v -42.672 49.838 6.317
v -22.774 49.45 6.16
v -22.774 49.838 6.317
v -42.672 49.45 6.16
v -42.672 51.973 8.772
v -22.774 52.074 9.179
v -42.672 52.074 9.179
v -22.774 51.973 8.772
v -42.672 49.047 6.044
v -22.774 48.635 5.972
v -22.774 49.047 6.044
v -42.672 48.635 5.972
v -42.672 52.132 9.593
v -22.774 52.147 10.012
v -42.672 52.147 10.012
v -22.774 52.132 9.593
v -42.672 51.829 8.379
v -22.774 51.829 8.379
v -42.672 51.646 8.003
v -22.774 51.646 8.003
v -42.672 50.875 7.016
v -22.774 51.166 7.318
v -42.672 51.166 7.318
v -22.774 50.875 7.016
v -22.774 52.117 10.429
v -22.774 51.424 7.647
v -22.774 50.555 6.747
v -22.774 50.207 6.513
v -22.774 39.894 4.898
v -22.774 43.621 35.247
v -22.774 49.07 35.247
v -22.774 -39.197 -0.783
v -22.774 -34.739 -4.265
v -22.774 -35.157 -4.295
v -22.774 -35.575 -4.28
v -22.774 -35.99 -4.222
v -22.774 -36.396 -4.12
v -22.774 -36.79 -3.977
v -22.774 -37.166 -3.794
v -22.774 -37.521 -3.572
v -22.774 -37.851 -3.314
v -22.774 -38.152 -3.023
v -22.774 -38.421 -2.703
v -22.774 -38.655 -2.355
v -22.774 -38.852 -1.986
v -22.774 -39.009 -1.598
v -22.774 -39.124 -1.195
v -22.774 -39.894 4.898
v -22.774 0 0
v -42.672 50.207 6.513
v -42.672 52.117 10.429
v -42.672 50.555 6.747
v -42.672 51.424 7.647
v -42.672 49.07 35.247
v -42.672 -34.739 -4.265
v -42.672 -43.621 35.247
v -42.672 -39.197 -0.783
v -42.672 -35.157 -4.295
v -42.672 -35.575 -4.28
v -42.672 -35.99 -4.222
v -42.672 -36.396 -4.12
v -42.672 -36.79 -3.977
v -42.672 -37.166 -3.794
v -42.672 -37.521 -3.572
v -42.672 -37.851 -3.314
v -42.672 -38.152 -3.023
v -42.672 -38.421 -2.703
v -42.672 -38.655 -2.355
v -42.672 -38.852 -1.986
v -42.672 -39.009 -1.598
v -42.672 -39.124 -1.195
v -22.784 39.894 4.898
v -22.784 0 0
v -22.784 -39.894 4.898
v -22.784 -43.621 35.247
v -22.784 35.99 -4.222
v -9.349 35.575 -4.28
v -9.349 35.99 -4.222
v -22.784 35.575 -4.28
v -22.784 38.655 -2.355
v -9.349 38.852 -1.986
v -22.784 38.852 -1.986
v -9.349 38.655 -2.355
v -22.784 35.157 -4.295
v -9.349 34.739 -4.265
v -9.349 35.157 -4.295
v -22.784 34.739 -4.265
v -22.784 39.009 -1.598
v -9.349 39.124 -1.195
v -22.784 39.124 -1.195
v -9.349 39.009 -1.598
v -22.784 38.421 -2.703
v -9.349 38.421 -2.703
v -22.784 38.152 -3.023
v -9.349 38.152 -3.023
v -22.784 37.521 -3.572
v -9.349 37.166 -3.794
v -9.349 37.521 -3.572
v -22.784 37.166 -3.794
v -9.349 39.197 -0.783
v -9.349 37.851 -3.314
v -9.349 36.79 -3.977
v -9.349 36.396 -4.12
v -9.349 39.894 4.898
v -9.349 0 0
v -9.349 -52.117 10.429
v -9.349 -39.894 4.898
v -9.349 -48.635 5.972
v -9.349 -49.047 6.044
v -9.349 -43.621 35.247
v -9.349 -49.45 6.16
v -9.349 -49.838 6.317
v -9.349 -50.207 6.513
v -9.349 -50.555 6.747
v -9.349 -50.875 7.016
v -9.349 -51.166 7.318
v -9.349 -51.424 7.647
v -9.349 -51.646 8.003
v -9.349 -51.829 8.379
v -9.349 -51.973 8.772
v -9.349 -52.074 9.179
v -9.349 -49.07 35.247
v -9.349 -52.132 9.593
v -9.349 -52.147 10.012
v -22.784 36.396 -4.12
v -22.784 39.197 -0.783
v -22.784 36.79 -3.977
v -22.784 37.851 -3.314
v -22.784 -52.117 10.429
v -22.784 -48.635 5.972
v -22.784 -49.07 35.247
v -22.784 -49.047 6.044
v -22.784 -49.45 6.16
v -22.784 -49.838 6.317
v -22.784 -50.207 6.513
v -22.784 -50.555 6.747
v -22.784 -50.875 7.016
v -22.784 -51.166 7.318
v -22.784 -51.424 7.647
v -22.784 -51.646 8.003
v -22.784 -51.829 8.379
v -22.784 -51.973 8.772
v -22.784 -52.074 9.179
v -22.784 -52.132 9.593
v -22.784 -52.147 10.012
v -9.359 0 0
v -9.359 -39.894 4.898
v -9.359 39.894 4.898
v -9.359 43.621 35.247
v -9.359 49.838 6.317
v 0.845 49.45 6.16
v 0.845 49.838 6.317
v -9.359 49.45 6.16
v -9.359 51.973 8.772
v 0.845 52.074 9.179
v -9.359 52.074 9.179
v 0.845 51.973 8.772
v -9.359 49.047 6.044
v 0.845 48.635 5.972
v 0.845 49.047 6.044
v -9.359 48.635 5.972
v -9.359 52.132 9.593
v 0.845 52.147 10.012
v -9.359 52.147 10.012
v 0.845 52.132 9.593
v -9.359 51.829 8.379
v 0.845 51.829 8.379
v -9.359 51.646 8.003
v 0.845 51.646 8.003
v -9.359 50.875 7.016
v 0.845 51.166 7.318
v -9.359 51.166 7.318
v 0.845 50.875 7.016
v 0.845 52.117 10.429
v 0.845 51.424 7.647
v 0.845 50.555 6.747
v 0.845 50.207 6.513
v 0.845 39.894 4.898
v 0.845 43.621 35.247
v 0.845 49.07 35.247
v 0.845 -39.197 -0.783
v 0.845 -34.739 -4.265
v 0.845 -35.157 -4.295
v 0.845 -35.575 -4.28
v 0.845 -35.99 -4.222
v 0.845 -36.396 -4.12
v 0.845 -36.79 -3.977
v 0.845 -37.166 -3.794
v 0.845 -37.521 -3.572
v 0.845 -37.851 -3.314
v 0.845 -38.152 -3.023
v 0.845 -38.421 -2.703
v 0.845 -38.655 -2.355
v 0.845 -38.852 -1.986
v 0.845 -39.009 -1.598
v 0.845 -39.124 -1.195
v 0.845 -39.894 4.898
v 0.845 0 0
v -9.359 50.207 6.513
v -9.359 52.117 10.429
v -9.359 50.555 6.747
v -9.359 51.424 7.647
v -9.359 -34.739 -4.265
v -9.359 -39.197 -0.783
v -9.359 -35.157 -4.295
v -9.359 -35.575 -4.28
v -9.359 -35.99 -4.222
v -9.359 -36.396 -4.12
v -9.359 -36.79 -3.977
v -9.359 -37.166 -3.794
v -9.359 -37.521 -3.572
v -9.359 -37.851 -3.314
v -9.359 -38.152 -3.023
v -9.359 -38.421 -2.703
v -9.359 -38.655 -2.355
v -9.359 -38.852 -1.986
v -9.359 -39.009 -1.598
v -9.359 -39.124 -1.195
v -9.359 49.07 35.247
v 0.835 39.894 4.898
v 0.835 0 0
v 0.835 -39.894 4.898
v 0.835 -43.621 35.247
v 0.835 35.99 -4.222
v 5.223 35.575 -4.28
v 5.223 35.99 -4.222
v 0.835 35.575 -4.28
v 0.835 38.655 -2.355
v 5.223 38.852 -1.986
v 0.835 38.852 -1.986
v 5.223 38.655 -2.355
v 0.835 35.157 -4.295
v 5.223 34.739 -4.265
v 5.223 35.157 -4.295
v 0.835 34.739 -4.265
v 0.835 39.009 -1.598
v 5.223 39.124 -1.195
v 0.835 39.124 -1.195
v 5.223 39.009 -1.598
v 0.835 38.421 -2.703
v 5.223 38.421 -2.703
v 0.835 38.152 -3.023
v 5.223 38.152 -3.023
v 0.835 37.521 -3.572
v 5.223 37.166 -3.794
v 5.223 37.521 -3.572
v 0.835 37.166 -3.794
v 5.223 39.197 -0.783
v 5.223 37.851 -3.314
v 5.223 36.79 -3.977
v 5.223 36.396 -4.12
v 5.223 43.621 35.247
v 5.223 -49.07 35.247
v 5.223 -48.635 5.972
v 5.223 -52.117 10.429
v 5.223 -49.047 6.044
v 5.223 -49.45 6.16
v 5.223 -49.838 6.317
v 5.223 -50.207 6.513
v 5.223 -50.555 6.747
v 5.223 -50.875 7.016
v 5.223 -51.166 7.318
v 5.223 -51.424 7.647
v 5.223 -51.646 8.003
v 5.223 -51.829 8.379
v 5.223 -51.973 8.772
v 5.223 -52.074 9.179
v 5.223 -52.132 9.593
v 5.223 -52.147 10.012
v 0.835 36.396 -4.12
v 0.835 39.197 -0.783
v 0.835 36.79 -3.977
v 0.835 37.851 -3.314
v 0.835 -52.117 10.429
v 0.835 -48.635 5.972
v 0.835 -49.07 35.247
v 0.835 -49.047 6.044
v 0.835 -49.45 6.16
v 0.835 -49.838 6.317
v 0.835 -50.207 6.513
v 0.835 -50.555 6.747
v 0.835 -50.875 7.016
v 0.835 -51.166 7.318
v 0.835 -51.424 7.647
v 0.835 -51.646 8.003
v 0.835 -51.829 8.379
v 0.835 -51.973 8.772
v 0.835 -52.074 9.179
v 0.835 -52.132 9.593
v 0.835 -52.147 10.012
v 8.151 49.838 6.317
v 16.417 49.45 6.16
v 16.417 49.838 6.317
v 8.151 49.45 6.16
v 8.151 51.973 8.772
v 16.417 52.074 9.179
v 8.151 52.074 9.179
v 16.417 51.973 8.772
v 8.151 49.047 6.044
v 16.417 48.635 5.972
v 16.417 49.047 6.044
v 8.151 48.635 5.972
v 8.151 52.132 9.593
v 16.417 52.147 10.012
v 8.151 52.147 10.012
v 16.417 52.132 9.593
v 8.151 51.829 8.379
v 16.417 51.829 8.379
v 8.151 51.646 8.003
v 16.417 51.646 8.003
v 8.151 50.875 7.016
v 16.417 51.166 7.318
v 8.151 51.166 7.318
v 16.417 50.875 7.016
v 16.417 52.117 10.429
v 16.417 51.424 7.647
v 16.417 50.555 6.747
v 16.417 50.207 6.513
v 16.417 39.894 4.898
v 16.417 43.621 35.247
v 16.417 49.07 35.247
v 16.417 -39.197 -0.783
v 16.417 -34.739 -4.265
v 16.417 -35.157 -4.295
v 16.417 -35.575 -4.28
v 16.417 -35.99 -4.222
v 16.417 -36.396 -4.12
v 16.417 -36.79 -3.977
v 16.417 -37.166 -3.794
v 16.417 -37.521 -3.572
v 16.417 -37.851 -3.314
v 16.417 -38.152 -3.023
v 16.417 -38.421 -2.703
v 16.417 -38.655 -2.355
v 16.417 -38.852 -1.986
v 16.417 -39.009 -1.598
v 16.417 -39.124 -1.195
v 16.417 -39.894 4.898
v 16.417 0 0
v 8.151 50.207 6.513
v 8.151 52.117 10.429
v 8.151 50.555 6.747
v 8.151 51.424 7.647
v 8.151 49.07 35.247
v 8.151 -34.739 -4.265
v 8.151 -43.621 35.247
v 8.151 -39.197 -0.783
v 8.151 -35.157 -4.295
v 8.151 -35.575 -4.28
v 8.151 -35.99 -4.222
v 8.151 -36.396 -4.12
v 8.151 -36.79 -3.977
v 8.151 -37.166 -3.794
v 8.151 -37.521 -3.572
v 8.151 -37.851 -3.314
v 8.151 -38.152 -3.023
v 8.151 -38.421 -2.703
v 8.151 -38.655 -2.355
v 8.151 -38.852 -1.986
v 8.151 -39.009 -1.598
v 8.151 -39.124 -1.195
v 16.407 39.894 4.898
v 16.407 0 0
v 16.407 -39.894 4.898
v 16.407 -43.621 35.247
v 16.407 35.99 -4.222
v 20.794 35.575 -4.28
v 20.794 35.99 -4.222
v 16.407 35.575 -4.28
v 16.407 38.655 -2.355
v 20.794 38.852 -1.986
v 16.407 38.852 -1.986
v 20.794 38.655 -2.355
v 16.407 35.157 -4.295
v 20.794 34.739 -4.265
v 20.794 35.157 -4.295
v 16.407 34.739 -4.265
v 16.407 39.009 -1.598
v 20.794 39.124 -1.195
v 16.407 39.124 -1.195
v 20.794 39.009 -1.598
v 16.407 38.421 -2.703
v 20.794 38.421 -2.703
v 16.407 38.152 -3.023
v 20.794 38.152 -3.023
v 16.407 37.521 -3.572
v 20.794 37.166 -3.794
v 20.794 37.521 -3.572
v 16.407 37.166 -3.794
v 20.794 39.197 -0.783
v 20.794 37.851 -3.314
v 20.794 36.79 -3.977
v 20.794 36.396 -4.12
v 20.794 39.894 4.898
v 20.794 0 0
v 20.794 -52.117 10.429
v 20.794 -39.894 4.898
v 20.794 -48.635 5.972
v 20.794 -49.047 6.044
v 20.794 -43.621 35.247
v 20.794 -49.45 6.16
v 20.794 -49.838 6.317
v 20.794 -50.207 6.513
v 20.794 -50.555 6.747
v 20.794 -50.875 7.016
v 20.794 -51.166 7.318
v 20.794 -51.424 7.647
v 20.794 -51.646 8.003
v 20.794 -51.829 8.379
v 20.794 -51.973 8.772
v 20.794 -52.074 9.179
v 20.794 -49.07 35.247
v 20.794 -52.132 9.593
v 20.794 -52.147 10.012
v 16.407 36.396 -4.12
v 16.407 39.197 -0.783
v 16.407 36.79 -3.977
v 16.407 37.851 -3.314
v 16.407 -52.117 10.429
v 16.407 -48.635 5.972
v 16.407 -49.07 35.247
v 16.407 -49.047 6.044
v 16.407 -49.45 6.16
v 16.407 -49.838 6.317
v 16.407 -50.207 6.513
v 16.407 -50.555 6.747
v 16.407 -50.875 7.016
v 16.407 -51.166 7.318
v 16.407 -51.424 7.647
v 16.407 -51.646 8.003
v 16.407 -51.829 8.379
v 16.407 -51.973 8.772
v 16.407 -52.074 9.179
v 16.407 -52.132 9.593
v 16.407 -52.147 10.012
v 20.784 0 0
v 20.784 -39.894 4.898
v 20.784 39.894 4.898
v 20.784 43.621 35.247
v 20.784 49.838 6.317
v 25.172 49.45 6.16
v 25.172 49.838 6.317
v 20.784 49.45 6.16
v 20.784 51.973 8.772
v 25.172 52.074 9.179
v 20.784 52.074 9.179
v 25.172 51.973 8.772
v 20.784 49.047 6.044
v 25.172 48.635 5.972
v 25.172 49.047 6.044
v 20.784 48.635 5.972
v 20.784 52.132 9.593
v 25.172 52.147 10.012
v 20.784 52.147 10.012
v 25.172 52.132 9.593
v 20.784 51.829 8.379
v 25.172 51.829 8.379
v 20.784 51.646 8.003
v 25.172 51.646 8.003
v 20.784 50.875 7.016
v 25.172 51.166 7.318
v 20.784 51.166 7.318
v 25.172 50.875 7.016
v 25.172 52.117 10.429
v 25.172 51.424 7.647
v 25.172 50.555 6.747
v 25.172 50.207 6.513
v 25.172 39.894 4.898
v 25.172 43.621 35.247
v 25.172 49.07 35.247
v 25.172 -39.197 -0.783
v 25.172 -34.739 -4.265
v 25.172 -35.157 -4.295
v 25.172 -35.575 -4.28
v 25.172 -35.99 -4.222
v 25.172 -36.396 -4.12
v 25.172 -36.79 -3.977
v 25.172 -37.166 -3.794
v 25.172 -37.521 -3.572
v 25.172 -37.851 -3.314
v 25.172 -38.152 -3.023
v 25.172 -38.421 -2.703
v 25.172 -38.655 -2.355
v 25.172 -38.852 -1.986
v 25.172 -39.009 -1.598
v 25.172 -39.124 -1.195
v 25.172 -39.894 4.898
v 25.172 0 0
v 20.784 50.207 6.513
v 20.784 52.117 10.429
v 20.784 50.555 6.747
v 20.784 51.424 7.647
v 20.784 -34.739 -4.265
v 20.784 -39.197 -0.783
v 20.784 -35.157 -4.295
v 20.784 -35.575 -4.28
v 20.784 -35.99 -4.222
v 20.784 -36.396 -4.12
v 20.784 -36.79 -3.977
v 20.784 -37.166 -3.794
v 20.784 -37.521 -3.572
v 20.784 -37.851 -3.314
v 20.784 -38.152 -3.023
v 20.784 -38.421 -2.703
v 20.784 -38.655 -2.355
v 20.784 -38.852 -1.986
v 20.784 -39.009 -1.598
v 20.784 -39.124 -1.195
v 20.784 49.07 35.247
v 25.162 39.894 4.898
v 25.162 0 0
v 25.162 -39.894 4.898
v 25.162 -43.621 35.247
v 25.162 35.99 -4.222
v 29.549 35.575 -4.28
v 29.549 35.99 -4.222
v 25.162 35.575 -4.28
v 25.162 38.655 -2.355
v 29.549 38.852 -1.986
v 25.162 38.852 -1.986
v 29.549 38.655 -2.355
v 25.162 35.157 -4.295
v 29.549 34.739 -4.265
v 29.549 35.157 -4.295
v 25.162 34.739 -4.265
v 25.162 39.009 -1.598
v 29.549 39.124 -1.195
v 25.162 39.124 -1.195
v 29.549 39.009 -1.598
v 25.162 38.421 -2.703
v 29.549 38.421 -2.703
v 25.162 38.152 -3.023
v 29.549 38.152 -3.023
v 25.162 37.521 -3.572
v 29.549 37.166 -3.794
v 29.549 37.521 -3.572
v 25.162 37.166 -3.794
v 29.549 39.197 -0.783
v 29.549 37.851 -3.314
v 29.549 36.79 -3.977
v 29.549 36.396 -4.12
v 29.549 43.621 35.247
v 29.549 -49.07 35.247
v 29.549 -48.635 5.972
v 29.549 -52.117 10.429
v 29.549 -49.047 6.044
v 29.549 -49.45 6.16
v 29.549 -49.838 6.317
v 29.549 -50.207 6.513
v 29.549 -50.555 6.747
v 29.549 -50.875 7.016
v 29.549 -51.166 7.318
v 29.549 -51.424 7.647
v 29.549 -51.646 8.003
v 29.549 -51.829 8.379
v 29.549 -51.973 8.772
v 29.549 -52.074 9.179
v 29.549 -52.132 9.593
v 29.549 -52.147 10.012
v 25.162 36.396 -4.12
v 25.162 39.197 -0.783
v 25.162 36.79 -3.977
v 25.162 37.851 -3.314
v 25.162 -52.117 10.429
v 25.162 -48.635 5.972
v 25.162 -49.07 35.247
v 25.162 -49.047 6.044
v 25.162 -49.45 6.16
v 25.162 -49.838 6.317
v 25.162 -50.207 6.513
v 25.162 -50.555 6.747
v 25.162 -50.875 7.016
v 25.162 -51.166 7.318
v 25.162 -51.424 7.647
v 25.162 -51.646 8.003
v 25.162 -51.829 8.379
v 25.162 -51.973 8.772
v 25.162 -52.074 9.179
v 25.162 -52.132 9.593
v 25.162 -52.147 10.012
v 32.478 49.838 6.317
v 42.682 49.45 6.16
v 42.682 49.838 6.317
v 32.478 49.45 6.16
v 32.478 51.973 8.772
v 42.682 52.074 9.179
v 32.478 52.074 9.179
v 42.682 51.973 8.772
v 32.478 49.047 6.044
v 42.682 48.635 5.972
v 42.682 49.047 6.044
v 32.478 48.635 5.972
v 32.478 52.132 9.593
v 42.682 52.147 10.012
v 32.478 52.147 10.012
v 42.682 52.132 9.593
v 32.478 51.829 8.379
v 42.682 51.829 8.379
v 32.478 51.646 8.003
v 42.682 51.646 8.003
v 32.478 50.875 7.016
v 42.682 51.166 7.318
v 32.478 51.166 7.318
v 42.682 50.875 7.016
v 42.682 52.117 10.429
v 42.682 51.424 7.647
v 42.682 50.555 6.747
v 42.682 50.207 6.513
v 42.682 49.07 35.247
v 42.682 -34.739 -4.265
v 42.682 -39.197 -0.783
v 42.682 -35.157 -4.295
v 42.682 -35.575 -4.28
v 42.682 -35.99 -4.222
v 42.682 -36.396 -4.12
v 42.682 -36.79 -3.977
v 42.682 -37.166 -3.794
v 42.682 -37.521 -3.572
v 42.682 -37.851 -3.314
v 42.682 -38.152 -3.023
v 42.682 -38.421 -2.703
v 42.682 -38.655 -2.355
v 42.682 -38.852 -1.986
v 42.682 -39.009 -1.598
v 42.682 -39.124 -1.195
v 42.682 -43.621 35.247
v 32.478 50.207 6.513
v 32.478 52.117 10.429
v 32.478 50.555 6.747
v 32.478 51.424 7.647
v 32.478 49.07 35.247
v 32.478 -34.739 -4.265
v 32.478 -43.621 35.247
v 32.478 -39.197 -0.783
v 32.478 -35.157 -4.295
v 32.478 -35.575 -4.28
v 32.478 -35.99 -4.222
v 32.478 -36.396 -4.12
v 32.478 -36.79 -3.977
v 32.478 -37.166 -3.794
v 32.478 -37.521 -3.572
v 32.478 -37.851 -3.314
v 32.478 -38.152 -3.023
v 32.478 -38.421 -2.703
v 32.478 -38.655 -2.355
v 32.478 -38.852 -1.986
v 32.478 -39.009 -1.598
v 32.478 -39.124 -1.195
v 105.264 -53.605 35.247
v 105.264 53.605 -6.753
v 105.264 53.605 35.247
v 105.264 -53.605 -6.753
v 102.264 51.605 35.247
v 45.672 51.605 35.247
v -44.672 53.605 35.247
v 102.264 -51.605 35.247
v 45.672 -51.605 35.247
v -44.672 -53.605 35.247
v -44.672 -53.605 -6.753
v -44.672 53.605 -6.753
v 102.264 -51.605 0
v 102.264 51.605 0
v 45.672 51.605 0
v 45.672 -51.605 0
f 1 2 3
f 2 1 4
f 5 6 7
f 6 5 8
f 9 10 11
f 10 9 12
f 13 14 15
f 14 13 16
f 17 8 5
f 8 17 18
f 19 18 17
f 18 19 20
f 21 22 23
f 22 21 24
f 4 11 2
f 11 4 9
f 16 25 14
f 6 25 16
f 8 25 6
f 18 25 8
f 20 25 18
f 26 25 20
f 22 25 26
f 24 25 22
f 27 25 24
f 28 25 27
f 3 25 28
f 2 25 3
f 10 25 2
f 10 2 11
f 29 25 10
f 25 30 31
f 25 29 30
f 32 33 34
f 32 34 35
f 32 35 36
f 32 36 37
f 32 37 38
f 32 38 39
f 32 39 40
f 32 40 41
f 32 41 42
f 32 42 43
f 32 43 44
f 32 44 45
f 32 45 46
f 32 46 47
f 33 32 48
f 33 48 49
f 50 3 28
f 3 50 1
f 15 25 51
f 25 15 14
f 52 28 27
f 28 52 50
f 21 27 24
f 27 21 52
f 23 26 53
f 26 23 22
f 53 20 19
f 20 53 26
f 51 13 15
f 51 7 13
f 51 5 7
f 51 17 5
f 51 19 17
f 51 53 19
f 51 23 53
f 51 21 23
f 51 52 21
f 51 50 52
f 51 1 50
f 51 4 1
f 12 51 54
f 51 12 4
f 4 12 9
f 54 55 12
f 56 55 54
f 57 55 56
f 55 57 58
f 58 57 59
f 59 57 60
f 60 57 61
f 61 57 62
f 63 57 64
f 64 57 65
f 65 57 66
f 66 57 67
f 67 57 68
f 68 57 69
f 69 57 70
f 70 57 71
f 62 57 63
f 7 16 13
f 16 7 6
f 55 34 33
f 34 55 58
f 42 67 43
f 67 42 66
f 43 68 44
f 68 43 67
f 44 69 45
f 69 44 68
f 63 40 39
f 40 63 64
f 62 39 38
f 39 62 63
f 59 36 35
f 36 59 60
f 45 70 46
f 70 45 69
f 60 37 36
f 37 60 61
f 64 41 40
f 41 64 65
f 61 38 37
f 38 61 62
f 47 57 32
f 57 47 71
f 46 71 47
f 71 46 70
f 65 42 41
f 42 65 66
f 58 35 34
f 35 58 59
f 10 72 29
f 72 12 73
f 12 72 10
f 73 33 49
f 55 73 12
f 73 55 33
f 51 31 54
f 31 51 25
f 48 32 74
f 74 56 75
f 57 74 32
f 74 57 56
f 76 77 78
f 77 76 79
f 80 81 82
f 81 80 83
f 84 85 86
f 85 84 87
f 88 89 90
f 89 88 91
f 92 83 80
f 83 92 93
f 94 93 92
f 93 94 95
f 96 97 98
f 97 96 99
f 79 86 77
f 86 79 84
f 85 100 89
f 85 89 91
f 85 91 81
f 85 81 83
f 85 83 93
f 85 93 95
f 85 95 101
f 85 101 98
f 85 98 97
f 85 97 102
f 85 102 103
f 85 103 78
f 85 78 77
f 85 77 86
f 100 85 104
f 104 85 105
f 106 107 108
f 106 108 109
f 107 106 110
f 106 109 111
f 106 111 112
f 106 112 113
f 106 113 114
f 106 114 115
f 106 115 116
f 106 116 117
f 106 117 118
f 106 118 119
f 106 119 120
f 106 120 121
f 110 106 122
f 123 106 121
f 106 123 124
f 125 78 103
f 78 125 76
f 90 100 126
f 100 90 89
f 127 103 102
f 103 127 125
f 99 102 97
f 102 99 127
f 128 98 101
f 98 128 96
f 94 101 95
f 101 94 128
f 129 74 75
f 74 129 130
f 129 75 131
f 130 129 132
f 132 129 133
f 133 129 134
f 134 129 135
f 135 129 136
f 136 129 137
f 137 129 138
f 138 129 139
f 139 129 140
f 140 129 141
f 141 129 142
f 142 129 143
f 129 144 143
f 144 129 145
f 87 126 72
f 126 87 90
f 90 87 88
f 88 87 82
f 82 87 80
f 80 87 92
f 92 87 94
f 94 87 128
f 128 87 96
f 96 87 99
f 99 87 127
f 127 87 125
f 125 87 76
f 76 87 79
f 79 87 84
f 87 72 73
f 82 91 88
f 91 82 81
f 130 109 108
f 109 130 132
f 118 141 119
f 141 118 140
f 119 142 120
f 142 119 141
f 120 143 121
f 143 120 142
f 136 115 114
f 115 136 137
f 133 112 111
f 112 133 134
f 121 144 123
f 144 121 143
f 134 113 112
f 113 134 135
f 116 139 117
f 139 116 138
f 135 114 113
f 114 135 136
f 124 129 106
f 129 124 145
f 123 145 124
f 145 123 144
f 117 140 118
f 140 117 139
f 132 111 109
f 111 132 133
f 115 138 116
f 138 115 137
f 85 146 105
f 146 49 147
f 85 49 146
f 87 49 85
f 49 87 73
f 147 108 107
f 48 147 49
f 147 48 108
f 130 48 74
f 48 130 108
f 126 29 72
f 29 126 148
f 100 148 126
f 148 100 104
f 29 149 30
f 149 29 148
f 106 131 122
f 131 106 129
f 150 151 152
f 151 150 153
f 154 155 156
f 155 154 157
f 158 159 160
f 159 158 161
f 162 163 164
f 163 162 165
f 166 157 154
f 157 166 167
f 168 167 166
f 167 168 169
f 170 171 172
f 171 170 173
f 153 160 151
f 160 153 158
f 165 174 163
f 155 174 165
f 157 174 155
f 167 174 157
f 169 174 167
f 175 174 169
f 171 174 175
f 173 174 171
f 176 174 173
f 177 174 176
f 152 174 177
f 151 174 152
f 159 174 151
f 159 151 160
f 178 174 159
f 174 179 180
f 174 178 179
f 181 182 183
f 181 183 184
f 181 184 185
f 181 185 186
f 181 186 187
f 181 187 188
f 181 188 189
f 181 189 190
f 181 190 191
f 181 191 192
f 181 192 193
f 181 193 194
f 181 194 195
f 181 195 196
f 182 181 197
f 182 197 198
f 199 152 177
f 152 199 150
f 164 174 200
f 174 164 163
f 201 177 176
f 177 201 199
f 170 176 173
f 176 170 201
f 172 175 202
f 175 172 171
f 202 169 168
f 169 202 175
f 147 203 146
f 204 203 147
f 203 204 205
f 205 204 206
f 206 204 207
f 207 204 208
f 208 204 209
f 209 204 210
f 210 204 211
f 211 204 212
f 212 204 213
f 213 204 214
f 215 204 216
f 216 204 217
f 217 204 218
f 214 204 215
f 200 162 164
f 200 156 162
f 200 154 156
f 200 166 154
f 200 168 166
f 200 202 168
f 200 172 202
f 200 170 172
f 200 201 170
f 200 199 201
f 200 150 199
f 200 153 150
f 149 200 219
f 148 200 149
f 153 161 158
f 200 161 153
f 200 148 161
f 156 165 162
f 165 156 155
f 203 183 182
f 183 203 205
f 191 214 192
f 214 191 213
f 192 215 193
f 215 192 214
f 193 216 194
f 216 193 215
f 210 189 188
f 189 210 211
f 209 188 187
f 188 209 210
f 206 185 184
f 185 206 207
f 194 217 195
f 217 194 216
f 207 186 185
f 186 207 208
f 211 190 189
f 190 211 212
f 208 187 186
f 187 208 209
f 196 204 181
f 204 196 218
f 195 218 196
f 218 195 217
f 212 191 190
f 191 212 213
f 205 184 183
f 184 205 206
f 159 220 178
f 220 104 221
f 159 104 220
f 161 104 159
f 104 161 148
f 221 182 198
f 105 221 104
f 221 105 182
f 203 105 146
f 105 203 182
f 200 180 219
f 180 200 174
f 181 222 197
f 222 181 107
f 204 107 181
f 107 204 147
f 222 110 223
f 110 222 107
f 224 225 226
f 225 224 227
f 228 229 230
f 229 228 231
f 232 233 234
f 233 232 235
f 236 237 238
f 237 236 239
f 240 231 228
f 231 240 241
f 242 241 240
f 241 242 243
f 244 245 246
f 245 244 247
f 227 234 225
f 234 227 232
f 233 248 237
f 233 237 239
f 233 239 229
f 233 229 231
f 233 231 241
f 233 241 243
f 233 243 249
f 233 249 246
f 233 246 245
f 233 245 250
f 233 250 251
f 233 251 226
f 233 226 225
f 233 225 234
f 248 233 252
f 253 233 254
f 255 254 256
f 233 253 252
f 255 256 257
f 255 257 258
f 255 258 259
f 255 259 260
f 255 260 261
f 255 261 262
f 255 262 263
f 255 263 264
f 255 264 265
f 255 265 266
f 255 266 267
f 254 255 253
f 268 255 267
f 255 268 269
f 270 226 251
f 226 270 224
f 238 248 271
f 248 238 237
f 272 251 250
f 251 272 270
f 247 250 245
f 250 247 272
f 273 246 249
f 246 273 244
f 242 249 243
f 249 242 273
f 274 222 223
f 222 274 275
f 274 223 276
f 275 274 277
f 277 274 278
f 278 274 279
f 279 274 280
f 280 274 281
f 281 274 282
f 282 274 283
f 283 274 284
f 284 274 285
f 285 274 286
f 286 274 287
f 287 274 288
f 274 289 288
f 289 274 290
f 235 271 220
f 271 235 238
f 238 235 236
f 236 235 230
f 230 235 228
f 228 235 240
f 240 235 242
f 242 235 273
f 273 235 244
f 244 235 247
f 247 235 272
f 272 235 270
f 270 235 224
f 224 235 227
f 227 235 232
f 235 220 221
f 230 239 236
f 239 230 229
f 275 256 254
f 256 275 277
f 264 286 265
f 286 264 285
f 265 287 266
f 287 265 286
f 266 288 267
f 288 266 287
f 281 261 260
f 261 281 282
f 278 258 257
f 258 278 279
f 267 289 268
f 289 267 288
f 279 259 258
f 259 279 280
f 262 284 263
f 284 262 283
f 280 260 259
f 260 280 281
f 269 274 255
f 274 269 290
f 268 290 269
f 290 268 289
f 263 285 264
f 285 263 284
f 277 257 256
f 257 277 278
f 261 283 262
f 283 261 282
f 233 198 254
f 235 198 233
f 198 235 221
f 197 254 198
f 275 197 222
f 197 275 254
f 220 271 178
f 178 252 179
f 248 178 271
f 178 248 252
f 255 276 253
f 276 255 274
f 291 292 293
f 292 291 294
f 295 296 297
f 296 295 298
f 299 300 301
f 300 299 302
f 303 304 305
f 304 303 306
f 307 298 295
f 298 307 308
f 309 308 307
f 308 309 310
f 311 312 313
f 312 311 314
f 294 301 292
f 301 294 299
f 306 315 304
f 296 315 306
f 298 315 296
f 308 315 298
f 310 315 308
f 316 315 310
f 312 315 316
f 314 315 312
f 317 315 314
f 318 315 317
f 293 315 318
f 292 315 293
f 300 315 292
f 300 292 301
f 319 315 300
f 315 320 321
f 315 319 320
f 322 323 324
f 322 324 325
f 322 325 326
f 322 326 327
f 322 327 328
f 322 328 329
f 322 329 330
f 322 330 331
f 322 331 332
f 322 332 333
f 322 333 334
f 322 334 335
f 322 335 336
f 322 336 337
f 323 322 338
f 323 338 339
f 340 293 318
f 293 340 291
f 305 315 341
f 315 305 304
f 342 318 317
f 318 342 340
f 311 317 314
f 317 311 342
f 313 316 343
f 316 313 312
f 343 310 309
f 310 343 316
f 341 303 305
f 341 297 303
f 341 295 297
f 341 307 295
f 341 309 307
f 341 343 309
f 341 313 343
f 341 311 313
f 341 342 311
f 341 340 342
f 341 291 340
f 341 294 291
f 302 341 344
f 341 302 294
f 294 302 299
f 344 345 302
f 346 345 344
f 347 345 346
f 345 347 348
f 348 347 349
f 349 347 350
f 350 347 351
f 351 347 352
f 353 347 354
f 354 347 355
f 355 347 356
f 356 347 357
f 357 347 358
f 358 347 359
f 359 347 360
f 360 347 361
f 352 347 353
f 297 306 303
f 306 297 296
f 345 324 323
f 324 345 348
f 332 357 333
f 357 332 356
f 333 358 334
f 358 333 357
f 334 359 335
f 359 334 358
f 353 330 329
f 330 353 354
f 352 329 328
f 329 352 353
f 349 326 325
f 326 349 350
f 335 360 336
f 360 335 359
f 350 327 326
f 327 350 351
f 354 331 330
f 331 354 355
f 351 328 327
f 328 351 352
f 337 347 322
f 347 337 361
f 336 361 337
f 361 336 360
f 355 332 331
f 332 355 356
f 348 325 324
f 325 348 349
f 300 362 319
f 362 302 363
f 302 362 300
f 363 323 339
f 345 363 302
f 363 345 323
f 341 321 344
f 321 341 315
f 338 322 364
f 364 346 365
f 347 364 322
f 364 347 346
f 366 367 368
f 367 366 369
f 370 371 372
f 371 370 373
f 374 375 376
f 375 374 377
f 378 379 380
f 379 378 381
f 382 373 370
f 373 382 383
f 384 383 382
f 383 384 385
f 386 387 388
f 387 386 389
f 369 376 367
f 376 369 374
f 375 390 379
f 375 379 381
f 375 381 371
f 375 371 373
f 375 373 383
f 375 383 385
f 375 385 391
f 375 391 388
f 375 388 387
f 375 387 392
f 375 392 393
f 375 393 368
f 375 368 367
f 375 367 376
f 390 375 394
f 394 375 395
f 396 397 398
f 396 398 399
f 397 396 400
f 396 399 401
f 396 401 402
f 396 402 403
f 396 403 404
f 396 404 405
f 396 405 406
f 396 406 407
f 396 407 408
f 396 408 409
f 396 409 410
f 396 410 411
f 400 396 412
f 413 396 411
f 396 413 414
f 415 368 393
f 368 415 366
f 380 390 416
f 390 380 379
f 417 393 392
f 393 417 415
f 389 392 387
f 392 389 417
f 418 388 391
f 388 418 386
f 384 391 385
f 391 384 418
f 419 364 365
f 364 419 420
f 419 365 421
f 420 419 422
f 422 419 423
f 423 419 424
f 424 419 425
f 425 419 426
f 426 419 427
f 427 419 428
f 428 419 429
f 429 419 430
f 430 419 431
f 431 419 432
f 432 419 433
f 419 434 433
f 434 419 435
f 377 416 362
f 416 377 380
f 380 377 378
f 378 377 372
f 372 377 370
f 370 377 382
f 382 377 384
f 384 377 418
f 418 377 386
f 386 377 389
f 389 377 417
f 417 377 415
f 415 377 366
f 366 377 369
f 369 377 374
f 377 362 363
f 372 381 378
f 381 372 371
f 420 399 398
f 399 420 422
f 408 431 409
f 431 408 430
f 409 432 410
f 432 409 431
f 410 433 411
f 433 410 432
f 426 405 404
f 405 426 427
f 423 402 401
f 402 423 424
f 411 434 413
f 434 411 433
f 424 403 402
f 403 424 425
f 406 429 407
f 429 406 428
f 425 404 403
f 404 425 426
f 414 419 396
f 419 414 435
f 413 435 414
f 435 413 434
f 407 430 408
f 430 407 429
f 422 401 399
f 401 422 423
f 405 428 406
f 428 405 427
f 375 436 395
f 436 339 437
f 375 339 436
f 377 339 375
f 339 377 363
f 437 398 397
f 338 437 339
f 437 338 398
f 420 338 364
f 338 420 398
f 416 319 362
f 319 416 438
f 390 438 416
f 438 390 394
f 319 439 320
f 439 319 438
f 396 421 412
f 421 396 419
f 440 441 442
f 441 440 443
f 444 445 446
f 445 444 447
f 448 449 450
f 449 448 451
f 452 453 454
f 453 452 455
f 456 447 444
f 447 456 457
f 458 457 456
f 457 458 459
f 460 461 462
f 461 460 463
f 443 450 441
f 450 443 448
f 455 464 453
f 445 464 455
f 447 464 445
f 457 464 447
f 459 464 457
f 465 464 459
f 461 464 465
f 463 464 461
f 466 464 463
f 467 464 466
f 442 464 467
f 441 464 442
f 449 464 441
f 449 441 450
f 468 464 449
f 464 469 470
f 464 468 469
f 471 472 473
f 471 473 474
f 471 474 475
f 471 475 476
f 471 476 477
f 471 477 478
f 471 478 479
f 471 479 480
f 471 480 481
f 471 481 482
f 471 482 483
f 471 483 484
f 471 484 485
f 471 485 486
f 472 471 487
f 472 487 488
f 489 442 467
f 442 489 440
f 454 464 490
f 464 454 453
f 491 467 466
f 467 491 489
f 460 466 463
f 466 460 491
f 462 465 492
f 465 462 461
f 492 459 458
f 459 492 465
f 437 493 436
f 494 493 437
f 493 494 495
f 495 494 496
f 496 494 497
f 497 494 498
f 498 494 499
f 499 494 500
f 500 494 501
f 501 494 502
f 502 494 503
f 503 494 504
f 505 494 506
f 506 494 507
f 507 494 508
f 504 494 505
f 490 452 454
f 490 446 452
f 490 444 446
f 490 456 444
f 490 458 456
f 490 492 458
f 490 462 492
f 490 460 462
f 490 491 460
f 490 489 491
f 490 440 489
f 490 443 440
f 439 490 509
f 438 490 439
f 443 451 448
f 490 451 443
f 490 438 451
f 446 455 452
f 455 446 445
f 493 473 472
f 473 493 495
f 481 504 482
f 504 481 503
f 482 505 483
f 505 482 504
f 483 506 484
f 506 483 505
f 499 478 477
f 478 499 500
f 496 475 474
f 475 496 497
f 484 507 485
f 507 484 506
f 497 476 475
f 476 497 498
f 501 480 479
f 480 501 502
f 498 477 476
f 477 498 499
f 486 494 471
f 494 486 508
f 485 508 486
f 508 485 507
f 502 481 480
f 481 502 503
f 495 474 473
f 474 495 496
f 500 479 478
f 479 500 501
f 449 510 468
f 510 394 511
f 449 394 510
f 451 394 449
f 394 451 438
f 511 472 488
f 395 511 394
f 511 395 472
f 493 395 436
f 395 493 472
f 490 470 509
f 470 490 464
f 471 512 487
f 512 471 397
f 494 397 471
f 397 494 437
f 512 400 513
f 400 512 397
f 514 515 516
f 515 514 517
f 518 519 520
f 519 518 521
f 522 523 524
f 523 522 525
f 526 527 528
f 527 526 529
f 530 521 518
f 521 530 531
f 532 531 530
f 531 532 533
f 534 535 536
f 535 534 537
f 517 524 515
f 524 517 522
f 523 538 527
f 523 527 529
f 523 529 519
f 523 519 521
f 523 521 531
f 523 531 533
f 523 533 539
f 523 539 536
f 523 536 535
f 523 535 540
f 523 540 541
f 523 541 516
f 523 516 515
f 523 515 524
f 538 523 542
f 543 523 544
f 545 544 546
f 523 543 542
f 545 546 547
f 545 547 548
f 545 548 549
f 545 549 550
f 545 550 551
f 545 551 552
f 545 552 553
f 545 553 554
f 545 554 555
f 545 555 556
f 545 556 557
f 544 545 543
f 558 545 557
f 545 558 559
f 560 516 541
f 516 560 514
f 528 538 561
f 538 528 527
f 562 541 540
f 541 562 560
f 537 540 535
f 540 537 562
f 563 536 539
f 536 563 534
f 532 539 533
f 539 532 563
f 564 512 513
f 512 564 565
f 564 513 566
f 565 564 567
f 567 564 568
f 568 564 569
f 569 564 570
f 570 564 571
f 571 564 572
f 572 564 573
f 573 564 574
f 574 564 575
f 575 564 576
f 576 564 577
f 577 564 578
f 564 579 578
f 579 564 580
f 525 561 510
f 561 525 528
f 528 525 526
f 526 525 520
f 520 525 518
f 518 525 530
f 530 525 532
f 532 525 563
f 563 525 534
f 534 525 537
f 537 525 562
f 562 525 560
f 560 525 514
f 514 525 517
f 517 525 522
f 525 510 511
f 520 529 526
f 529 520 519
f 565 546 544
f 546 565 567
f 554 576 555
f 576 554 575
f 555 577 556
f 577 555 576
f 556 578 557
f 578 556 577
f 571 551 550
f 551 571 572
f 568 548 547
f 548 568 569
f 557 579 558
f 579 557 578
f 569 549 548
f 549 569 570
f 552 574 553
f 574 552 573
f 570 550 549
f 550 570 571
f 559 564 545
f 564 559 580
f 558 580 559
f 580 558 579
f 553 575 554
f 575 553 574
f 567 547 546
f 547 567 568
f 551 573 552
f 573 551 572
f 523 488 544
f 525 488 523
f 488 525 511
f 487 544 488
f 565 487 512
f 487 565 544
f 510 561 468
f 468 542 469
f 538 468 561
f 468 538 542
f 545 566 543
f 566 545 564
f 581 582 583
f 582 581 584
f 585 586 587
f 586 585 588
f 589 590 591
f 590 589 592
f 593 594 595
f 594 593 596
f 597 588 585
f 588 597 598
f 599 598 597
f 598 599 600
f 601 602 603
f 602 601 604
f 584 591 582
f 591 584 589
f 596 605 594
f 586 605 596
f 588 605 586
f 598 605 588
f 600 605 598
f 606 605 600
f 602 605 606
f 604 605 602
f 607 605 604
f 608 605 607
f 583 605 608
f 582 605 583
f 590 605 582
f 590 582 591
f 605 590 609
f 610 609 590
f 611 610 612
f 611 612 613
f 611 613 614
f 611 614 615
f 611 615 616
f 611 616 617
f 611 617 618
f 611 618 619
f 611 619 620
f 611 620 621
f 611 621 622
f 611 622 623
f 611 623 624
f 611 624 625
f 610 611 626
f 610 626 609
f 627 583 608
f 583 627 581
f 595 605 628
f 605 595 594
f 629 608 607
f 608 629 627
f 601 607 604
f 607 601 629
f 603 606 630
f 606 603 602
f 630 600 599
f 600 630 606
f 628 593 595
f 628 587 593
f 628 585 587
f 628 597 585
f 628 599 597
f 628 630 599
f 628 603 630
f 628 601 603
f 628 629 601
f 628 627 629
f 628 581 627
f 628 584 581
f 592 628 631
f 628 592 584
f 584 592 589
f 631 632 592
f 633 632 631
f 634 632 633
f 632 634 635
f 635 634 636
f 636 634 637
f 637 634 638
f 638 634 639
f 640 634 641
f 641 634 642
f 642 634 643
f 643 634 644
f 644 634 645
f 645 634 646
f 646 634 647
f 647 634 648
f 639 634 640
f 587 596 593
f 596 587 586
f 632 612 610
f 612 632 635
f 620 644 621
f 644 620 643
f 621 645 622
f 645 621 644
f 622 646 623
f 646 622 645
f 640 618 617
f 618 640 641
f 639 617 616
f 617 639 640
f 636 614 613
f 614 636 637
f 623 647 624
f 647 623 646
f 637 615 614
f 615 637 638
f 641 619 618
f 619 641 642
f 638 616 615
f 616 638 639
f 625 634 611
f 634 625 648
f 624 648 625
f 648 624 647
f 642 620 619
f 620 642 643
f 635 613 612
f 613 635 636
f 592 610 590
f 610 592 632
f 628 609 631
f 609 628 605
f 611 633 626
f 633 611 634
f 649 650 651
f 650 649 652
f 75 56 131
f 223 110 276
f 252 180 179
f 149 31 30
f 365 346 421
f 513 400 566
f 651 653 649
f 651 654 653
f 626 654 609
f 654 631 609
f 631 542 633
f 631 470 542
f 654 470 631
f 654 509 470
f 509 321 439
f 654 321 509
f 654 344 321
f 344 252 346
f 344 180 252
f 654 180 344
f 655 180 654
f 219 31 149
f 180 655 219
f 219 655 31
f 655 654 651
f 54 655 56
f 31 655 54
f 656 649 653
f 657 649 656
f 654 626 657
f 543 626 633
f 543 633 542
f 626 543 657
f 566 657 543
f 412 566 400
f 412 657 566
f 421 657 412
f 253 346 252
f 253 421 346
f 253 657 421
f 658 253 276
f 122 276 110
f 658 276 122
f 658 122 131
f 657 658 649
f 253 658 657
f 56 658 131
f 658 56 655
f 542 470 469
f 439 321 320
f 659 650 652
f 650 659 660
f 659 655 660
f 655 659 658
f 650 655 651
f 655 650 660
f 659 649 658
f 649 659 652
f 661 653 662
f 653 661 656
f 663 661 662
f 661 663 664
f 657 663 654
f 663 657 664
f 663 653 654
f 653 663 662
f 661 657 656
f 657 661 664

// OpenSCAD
// file: CONFIG_Basic.scad
cards = [
    [60, "Copper - ", "Treasure"], 
    [40, "Silver -", "Treasure"],
    [30, "Gold -", "Treasure"],
    [12, "Platinum -", "Treasure"],
    
    [-6], [0], // Divider
    
    [24, "Estate -", "Victory"],
    [12, "Duchy -", "Victory"],
    [12, "Province -", "Victory"],
    [12, "Colony -", "Victory"],
    
    [-6], [0], // Divider
    
    [30, "Curse -", "Curse"],
];

forceBoxLength = 2 * 72.4709 + 2.783 + 2.211;
// file: DominionBoxHelper.scad
cards = [];
forceBoxLength = 0;

$fn = 60;
cardThickness = 0.3231333;
deckTolorance = 0.5;
slotHeight = 40;
cardLength = 92;
cardWidth = 60;
deckShift = 14;
deckRotation = 7;
boxThickness = [2,1,2];
cardEdgeRadius = 4;
textPlateThickness = 0.4;
textThickness = 0.4;

rotatedWidth = cos(deckRotation) * (cardLength + deckShift);
rotatedHeight = cos(deckRotation) * (cardWidth) + sin(deckRotation) * (cardLength + deckShift);

allCardsThickness = cardThickness*sum_to_index(cards, len(cards)-1) + deckTolorance * len(cards);

boxSize = [
        max(forceBoxLength, allCardsThickness + 2 * boxThickness.x),
        rotatedWidth + 2 * boxThickness.y,
        slotHeight + boxThickness.z
        ];

module defineObject(object_name) {
    if (current_object != "ALL" && current_object != object_name) {
        *children();
    } else {
        children();
    }
}

function sum_to_index(arr, i) =
    i < 0 ? 0 : abs(arr[i][0]) + sum_to_index(arr, i - 1);
    
module deck(i)
{
    union()
    {
        depth = cardThickness*cards[i][0] + deckTolorance + 0.01;
        rotate([0,90,0])
        translate([(0.5*cardWidth - cardEdgeRadius), (0.5*cardLength - cardEdgeRadius), 0])
        cylinder(h=depth, r=cardEdgeRadius, center=true);
        rotate([0,90,0])
        translate([-(0.5*cardWidth - cardEdgeRadius), (0.5*cardLength - cardEdgeRadius), 0])
        cylinder(h=depth, r=cardEdgeRadius, center=true);
        rotate([0,90,0])
        translate([(0.5*cardWidth - cardEdgeRadius), -(0.5*cardLength - cardEdgeRadius), 0])
        cylinder(h=depth, r=cardEdgeRadius, center=true);
        rotate([0,90,0])
        translate([-(0.5*cardWidth - cardEdgeRadius), -(0.5*cardLength - cardEdgeRadius), 0])
        cylinder(h=depth, r=cardEdgeRadius, center=true);
        cube([depth, cardLength - 2 * cardEdgeRadius, cardWidth], true);
        cube([depth, cardLength, cardWidth - 2 * cardEdgeRadius], true);
    }
}
    
module cardSlot(i)
{
    slotThickness = cardThickness*cards[i][0] + deckTolorance + 0.01;
    rotate((i%2 ? -1 : 1) * deckRotation, [1,0,0])
    translate(0.5*[slotThickness, cardLength, cardWidth])
    translate(-0.5 * [allCardsThickness, cardLength, 0]) // center
    translate([cardThickness*sum_to_index(cards, i-1) + deckTolorance * i, (i%2 ? -0.5 : 0.5)*deckShift, 0])
    deck(i);
}

module tokenSlot()
{
    slotThickness = 20;
    
    translate(0.5*[slotThickness, cardLength, cardWidth])
    translate(-0.5 * [allCardsThickness, cardLength, 0]) // center
    translate([allCardsThickness, 0, 0])
    cube([slotThickness, cardLength, cardWidth], true);
}

module cardName(i)
{
    translate([cardThickness*sum_to_index(cards, i-1) + deckTolorance * i, 0, 0])
    translate(0.5*[cardThickness*cards[i][0], 0, -3])
    rotate([90,-90,0])
    {
        linear_extrude(height=textThickness)
        text(cards[i][1], 2.6, "overpass", halign = "right", valign = "center");
    }
}
// main file
include <DominionBoxHelper.scad>

include <CONFIG_Basic.scad>

current_object = "ALL";
//current_object = "Box";
//current_object = "TextPlate";
//current_object = "action";
//current_object = "treasure";
//current_object = "victory";
//current_object = "curse";
//current_object = "duration";

defineObject("Box") color([0.2,0.2,0.2])
{
    expectedLength = allCardsThickness + 2 * boxThickness.x;
    difference()
    {
        translate([
            0.5 * (boxSize.x - expectedLength),
            0,
            0.5 * (slotHeight - boxThickness[2]) - sin(deckRotation)*(0.5*(cardLength-deckShift))
        ])
        cube(boxSize, true);
        
        for( i = [0:len(cards)-1])
        {
            if (cards[i][0] > 0)
            {
                cardSlot(i);
            }
        }
        
        translate(0.5*[boxSize.x - boxThickness.x, 0, cardWidth])
        cube([
        boxSize.x - expectedLength - 2 * boxThickness.x, 
        boxSize.y - 4 * boxThickness.y, 
        cardWidth
        ], true);
    }
    
    
    
}
